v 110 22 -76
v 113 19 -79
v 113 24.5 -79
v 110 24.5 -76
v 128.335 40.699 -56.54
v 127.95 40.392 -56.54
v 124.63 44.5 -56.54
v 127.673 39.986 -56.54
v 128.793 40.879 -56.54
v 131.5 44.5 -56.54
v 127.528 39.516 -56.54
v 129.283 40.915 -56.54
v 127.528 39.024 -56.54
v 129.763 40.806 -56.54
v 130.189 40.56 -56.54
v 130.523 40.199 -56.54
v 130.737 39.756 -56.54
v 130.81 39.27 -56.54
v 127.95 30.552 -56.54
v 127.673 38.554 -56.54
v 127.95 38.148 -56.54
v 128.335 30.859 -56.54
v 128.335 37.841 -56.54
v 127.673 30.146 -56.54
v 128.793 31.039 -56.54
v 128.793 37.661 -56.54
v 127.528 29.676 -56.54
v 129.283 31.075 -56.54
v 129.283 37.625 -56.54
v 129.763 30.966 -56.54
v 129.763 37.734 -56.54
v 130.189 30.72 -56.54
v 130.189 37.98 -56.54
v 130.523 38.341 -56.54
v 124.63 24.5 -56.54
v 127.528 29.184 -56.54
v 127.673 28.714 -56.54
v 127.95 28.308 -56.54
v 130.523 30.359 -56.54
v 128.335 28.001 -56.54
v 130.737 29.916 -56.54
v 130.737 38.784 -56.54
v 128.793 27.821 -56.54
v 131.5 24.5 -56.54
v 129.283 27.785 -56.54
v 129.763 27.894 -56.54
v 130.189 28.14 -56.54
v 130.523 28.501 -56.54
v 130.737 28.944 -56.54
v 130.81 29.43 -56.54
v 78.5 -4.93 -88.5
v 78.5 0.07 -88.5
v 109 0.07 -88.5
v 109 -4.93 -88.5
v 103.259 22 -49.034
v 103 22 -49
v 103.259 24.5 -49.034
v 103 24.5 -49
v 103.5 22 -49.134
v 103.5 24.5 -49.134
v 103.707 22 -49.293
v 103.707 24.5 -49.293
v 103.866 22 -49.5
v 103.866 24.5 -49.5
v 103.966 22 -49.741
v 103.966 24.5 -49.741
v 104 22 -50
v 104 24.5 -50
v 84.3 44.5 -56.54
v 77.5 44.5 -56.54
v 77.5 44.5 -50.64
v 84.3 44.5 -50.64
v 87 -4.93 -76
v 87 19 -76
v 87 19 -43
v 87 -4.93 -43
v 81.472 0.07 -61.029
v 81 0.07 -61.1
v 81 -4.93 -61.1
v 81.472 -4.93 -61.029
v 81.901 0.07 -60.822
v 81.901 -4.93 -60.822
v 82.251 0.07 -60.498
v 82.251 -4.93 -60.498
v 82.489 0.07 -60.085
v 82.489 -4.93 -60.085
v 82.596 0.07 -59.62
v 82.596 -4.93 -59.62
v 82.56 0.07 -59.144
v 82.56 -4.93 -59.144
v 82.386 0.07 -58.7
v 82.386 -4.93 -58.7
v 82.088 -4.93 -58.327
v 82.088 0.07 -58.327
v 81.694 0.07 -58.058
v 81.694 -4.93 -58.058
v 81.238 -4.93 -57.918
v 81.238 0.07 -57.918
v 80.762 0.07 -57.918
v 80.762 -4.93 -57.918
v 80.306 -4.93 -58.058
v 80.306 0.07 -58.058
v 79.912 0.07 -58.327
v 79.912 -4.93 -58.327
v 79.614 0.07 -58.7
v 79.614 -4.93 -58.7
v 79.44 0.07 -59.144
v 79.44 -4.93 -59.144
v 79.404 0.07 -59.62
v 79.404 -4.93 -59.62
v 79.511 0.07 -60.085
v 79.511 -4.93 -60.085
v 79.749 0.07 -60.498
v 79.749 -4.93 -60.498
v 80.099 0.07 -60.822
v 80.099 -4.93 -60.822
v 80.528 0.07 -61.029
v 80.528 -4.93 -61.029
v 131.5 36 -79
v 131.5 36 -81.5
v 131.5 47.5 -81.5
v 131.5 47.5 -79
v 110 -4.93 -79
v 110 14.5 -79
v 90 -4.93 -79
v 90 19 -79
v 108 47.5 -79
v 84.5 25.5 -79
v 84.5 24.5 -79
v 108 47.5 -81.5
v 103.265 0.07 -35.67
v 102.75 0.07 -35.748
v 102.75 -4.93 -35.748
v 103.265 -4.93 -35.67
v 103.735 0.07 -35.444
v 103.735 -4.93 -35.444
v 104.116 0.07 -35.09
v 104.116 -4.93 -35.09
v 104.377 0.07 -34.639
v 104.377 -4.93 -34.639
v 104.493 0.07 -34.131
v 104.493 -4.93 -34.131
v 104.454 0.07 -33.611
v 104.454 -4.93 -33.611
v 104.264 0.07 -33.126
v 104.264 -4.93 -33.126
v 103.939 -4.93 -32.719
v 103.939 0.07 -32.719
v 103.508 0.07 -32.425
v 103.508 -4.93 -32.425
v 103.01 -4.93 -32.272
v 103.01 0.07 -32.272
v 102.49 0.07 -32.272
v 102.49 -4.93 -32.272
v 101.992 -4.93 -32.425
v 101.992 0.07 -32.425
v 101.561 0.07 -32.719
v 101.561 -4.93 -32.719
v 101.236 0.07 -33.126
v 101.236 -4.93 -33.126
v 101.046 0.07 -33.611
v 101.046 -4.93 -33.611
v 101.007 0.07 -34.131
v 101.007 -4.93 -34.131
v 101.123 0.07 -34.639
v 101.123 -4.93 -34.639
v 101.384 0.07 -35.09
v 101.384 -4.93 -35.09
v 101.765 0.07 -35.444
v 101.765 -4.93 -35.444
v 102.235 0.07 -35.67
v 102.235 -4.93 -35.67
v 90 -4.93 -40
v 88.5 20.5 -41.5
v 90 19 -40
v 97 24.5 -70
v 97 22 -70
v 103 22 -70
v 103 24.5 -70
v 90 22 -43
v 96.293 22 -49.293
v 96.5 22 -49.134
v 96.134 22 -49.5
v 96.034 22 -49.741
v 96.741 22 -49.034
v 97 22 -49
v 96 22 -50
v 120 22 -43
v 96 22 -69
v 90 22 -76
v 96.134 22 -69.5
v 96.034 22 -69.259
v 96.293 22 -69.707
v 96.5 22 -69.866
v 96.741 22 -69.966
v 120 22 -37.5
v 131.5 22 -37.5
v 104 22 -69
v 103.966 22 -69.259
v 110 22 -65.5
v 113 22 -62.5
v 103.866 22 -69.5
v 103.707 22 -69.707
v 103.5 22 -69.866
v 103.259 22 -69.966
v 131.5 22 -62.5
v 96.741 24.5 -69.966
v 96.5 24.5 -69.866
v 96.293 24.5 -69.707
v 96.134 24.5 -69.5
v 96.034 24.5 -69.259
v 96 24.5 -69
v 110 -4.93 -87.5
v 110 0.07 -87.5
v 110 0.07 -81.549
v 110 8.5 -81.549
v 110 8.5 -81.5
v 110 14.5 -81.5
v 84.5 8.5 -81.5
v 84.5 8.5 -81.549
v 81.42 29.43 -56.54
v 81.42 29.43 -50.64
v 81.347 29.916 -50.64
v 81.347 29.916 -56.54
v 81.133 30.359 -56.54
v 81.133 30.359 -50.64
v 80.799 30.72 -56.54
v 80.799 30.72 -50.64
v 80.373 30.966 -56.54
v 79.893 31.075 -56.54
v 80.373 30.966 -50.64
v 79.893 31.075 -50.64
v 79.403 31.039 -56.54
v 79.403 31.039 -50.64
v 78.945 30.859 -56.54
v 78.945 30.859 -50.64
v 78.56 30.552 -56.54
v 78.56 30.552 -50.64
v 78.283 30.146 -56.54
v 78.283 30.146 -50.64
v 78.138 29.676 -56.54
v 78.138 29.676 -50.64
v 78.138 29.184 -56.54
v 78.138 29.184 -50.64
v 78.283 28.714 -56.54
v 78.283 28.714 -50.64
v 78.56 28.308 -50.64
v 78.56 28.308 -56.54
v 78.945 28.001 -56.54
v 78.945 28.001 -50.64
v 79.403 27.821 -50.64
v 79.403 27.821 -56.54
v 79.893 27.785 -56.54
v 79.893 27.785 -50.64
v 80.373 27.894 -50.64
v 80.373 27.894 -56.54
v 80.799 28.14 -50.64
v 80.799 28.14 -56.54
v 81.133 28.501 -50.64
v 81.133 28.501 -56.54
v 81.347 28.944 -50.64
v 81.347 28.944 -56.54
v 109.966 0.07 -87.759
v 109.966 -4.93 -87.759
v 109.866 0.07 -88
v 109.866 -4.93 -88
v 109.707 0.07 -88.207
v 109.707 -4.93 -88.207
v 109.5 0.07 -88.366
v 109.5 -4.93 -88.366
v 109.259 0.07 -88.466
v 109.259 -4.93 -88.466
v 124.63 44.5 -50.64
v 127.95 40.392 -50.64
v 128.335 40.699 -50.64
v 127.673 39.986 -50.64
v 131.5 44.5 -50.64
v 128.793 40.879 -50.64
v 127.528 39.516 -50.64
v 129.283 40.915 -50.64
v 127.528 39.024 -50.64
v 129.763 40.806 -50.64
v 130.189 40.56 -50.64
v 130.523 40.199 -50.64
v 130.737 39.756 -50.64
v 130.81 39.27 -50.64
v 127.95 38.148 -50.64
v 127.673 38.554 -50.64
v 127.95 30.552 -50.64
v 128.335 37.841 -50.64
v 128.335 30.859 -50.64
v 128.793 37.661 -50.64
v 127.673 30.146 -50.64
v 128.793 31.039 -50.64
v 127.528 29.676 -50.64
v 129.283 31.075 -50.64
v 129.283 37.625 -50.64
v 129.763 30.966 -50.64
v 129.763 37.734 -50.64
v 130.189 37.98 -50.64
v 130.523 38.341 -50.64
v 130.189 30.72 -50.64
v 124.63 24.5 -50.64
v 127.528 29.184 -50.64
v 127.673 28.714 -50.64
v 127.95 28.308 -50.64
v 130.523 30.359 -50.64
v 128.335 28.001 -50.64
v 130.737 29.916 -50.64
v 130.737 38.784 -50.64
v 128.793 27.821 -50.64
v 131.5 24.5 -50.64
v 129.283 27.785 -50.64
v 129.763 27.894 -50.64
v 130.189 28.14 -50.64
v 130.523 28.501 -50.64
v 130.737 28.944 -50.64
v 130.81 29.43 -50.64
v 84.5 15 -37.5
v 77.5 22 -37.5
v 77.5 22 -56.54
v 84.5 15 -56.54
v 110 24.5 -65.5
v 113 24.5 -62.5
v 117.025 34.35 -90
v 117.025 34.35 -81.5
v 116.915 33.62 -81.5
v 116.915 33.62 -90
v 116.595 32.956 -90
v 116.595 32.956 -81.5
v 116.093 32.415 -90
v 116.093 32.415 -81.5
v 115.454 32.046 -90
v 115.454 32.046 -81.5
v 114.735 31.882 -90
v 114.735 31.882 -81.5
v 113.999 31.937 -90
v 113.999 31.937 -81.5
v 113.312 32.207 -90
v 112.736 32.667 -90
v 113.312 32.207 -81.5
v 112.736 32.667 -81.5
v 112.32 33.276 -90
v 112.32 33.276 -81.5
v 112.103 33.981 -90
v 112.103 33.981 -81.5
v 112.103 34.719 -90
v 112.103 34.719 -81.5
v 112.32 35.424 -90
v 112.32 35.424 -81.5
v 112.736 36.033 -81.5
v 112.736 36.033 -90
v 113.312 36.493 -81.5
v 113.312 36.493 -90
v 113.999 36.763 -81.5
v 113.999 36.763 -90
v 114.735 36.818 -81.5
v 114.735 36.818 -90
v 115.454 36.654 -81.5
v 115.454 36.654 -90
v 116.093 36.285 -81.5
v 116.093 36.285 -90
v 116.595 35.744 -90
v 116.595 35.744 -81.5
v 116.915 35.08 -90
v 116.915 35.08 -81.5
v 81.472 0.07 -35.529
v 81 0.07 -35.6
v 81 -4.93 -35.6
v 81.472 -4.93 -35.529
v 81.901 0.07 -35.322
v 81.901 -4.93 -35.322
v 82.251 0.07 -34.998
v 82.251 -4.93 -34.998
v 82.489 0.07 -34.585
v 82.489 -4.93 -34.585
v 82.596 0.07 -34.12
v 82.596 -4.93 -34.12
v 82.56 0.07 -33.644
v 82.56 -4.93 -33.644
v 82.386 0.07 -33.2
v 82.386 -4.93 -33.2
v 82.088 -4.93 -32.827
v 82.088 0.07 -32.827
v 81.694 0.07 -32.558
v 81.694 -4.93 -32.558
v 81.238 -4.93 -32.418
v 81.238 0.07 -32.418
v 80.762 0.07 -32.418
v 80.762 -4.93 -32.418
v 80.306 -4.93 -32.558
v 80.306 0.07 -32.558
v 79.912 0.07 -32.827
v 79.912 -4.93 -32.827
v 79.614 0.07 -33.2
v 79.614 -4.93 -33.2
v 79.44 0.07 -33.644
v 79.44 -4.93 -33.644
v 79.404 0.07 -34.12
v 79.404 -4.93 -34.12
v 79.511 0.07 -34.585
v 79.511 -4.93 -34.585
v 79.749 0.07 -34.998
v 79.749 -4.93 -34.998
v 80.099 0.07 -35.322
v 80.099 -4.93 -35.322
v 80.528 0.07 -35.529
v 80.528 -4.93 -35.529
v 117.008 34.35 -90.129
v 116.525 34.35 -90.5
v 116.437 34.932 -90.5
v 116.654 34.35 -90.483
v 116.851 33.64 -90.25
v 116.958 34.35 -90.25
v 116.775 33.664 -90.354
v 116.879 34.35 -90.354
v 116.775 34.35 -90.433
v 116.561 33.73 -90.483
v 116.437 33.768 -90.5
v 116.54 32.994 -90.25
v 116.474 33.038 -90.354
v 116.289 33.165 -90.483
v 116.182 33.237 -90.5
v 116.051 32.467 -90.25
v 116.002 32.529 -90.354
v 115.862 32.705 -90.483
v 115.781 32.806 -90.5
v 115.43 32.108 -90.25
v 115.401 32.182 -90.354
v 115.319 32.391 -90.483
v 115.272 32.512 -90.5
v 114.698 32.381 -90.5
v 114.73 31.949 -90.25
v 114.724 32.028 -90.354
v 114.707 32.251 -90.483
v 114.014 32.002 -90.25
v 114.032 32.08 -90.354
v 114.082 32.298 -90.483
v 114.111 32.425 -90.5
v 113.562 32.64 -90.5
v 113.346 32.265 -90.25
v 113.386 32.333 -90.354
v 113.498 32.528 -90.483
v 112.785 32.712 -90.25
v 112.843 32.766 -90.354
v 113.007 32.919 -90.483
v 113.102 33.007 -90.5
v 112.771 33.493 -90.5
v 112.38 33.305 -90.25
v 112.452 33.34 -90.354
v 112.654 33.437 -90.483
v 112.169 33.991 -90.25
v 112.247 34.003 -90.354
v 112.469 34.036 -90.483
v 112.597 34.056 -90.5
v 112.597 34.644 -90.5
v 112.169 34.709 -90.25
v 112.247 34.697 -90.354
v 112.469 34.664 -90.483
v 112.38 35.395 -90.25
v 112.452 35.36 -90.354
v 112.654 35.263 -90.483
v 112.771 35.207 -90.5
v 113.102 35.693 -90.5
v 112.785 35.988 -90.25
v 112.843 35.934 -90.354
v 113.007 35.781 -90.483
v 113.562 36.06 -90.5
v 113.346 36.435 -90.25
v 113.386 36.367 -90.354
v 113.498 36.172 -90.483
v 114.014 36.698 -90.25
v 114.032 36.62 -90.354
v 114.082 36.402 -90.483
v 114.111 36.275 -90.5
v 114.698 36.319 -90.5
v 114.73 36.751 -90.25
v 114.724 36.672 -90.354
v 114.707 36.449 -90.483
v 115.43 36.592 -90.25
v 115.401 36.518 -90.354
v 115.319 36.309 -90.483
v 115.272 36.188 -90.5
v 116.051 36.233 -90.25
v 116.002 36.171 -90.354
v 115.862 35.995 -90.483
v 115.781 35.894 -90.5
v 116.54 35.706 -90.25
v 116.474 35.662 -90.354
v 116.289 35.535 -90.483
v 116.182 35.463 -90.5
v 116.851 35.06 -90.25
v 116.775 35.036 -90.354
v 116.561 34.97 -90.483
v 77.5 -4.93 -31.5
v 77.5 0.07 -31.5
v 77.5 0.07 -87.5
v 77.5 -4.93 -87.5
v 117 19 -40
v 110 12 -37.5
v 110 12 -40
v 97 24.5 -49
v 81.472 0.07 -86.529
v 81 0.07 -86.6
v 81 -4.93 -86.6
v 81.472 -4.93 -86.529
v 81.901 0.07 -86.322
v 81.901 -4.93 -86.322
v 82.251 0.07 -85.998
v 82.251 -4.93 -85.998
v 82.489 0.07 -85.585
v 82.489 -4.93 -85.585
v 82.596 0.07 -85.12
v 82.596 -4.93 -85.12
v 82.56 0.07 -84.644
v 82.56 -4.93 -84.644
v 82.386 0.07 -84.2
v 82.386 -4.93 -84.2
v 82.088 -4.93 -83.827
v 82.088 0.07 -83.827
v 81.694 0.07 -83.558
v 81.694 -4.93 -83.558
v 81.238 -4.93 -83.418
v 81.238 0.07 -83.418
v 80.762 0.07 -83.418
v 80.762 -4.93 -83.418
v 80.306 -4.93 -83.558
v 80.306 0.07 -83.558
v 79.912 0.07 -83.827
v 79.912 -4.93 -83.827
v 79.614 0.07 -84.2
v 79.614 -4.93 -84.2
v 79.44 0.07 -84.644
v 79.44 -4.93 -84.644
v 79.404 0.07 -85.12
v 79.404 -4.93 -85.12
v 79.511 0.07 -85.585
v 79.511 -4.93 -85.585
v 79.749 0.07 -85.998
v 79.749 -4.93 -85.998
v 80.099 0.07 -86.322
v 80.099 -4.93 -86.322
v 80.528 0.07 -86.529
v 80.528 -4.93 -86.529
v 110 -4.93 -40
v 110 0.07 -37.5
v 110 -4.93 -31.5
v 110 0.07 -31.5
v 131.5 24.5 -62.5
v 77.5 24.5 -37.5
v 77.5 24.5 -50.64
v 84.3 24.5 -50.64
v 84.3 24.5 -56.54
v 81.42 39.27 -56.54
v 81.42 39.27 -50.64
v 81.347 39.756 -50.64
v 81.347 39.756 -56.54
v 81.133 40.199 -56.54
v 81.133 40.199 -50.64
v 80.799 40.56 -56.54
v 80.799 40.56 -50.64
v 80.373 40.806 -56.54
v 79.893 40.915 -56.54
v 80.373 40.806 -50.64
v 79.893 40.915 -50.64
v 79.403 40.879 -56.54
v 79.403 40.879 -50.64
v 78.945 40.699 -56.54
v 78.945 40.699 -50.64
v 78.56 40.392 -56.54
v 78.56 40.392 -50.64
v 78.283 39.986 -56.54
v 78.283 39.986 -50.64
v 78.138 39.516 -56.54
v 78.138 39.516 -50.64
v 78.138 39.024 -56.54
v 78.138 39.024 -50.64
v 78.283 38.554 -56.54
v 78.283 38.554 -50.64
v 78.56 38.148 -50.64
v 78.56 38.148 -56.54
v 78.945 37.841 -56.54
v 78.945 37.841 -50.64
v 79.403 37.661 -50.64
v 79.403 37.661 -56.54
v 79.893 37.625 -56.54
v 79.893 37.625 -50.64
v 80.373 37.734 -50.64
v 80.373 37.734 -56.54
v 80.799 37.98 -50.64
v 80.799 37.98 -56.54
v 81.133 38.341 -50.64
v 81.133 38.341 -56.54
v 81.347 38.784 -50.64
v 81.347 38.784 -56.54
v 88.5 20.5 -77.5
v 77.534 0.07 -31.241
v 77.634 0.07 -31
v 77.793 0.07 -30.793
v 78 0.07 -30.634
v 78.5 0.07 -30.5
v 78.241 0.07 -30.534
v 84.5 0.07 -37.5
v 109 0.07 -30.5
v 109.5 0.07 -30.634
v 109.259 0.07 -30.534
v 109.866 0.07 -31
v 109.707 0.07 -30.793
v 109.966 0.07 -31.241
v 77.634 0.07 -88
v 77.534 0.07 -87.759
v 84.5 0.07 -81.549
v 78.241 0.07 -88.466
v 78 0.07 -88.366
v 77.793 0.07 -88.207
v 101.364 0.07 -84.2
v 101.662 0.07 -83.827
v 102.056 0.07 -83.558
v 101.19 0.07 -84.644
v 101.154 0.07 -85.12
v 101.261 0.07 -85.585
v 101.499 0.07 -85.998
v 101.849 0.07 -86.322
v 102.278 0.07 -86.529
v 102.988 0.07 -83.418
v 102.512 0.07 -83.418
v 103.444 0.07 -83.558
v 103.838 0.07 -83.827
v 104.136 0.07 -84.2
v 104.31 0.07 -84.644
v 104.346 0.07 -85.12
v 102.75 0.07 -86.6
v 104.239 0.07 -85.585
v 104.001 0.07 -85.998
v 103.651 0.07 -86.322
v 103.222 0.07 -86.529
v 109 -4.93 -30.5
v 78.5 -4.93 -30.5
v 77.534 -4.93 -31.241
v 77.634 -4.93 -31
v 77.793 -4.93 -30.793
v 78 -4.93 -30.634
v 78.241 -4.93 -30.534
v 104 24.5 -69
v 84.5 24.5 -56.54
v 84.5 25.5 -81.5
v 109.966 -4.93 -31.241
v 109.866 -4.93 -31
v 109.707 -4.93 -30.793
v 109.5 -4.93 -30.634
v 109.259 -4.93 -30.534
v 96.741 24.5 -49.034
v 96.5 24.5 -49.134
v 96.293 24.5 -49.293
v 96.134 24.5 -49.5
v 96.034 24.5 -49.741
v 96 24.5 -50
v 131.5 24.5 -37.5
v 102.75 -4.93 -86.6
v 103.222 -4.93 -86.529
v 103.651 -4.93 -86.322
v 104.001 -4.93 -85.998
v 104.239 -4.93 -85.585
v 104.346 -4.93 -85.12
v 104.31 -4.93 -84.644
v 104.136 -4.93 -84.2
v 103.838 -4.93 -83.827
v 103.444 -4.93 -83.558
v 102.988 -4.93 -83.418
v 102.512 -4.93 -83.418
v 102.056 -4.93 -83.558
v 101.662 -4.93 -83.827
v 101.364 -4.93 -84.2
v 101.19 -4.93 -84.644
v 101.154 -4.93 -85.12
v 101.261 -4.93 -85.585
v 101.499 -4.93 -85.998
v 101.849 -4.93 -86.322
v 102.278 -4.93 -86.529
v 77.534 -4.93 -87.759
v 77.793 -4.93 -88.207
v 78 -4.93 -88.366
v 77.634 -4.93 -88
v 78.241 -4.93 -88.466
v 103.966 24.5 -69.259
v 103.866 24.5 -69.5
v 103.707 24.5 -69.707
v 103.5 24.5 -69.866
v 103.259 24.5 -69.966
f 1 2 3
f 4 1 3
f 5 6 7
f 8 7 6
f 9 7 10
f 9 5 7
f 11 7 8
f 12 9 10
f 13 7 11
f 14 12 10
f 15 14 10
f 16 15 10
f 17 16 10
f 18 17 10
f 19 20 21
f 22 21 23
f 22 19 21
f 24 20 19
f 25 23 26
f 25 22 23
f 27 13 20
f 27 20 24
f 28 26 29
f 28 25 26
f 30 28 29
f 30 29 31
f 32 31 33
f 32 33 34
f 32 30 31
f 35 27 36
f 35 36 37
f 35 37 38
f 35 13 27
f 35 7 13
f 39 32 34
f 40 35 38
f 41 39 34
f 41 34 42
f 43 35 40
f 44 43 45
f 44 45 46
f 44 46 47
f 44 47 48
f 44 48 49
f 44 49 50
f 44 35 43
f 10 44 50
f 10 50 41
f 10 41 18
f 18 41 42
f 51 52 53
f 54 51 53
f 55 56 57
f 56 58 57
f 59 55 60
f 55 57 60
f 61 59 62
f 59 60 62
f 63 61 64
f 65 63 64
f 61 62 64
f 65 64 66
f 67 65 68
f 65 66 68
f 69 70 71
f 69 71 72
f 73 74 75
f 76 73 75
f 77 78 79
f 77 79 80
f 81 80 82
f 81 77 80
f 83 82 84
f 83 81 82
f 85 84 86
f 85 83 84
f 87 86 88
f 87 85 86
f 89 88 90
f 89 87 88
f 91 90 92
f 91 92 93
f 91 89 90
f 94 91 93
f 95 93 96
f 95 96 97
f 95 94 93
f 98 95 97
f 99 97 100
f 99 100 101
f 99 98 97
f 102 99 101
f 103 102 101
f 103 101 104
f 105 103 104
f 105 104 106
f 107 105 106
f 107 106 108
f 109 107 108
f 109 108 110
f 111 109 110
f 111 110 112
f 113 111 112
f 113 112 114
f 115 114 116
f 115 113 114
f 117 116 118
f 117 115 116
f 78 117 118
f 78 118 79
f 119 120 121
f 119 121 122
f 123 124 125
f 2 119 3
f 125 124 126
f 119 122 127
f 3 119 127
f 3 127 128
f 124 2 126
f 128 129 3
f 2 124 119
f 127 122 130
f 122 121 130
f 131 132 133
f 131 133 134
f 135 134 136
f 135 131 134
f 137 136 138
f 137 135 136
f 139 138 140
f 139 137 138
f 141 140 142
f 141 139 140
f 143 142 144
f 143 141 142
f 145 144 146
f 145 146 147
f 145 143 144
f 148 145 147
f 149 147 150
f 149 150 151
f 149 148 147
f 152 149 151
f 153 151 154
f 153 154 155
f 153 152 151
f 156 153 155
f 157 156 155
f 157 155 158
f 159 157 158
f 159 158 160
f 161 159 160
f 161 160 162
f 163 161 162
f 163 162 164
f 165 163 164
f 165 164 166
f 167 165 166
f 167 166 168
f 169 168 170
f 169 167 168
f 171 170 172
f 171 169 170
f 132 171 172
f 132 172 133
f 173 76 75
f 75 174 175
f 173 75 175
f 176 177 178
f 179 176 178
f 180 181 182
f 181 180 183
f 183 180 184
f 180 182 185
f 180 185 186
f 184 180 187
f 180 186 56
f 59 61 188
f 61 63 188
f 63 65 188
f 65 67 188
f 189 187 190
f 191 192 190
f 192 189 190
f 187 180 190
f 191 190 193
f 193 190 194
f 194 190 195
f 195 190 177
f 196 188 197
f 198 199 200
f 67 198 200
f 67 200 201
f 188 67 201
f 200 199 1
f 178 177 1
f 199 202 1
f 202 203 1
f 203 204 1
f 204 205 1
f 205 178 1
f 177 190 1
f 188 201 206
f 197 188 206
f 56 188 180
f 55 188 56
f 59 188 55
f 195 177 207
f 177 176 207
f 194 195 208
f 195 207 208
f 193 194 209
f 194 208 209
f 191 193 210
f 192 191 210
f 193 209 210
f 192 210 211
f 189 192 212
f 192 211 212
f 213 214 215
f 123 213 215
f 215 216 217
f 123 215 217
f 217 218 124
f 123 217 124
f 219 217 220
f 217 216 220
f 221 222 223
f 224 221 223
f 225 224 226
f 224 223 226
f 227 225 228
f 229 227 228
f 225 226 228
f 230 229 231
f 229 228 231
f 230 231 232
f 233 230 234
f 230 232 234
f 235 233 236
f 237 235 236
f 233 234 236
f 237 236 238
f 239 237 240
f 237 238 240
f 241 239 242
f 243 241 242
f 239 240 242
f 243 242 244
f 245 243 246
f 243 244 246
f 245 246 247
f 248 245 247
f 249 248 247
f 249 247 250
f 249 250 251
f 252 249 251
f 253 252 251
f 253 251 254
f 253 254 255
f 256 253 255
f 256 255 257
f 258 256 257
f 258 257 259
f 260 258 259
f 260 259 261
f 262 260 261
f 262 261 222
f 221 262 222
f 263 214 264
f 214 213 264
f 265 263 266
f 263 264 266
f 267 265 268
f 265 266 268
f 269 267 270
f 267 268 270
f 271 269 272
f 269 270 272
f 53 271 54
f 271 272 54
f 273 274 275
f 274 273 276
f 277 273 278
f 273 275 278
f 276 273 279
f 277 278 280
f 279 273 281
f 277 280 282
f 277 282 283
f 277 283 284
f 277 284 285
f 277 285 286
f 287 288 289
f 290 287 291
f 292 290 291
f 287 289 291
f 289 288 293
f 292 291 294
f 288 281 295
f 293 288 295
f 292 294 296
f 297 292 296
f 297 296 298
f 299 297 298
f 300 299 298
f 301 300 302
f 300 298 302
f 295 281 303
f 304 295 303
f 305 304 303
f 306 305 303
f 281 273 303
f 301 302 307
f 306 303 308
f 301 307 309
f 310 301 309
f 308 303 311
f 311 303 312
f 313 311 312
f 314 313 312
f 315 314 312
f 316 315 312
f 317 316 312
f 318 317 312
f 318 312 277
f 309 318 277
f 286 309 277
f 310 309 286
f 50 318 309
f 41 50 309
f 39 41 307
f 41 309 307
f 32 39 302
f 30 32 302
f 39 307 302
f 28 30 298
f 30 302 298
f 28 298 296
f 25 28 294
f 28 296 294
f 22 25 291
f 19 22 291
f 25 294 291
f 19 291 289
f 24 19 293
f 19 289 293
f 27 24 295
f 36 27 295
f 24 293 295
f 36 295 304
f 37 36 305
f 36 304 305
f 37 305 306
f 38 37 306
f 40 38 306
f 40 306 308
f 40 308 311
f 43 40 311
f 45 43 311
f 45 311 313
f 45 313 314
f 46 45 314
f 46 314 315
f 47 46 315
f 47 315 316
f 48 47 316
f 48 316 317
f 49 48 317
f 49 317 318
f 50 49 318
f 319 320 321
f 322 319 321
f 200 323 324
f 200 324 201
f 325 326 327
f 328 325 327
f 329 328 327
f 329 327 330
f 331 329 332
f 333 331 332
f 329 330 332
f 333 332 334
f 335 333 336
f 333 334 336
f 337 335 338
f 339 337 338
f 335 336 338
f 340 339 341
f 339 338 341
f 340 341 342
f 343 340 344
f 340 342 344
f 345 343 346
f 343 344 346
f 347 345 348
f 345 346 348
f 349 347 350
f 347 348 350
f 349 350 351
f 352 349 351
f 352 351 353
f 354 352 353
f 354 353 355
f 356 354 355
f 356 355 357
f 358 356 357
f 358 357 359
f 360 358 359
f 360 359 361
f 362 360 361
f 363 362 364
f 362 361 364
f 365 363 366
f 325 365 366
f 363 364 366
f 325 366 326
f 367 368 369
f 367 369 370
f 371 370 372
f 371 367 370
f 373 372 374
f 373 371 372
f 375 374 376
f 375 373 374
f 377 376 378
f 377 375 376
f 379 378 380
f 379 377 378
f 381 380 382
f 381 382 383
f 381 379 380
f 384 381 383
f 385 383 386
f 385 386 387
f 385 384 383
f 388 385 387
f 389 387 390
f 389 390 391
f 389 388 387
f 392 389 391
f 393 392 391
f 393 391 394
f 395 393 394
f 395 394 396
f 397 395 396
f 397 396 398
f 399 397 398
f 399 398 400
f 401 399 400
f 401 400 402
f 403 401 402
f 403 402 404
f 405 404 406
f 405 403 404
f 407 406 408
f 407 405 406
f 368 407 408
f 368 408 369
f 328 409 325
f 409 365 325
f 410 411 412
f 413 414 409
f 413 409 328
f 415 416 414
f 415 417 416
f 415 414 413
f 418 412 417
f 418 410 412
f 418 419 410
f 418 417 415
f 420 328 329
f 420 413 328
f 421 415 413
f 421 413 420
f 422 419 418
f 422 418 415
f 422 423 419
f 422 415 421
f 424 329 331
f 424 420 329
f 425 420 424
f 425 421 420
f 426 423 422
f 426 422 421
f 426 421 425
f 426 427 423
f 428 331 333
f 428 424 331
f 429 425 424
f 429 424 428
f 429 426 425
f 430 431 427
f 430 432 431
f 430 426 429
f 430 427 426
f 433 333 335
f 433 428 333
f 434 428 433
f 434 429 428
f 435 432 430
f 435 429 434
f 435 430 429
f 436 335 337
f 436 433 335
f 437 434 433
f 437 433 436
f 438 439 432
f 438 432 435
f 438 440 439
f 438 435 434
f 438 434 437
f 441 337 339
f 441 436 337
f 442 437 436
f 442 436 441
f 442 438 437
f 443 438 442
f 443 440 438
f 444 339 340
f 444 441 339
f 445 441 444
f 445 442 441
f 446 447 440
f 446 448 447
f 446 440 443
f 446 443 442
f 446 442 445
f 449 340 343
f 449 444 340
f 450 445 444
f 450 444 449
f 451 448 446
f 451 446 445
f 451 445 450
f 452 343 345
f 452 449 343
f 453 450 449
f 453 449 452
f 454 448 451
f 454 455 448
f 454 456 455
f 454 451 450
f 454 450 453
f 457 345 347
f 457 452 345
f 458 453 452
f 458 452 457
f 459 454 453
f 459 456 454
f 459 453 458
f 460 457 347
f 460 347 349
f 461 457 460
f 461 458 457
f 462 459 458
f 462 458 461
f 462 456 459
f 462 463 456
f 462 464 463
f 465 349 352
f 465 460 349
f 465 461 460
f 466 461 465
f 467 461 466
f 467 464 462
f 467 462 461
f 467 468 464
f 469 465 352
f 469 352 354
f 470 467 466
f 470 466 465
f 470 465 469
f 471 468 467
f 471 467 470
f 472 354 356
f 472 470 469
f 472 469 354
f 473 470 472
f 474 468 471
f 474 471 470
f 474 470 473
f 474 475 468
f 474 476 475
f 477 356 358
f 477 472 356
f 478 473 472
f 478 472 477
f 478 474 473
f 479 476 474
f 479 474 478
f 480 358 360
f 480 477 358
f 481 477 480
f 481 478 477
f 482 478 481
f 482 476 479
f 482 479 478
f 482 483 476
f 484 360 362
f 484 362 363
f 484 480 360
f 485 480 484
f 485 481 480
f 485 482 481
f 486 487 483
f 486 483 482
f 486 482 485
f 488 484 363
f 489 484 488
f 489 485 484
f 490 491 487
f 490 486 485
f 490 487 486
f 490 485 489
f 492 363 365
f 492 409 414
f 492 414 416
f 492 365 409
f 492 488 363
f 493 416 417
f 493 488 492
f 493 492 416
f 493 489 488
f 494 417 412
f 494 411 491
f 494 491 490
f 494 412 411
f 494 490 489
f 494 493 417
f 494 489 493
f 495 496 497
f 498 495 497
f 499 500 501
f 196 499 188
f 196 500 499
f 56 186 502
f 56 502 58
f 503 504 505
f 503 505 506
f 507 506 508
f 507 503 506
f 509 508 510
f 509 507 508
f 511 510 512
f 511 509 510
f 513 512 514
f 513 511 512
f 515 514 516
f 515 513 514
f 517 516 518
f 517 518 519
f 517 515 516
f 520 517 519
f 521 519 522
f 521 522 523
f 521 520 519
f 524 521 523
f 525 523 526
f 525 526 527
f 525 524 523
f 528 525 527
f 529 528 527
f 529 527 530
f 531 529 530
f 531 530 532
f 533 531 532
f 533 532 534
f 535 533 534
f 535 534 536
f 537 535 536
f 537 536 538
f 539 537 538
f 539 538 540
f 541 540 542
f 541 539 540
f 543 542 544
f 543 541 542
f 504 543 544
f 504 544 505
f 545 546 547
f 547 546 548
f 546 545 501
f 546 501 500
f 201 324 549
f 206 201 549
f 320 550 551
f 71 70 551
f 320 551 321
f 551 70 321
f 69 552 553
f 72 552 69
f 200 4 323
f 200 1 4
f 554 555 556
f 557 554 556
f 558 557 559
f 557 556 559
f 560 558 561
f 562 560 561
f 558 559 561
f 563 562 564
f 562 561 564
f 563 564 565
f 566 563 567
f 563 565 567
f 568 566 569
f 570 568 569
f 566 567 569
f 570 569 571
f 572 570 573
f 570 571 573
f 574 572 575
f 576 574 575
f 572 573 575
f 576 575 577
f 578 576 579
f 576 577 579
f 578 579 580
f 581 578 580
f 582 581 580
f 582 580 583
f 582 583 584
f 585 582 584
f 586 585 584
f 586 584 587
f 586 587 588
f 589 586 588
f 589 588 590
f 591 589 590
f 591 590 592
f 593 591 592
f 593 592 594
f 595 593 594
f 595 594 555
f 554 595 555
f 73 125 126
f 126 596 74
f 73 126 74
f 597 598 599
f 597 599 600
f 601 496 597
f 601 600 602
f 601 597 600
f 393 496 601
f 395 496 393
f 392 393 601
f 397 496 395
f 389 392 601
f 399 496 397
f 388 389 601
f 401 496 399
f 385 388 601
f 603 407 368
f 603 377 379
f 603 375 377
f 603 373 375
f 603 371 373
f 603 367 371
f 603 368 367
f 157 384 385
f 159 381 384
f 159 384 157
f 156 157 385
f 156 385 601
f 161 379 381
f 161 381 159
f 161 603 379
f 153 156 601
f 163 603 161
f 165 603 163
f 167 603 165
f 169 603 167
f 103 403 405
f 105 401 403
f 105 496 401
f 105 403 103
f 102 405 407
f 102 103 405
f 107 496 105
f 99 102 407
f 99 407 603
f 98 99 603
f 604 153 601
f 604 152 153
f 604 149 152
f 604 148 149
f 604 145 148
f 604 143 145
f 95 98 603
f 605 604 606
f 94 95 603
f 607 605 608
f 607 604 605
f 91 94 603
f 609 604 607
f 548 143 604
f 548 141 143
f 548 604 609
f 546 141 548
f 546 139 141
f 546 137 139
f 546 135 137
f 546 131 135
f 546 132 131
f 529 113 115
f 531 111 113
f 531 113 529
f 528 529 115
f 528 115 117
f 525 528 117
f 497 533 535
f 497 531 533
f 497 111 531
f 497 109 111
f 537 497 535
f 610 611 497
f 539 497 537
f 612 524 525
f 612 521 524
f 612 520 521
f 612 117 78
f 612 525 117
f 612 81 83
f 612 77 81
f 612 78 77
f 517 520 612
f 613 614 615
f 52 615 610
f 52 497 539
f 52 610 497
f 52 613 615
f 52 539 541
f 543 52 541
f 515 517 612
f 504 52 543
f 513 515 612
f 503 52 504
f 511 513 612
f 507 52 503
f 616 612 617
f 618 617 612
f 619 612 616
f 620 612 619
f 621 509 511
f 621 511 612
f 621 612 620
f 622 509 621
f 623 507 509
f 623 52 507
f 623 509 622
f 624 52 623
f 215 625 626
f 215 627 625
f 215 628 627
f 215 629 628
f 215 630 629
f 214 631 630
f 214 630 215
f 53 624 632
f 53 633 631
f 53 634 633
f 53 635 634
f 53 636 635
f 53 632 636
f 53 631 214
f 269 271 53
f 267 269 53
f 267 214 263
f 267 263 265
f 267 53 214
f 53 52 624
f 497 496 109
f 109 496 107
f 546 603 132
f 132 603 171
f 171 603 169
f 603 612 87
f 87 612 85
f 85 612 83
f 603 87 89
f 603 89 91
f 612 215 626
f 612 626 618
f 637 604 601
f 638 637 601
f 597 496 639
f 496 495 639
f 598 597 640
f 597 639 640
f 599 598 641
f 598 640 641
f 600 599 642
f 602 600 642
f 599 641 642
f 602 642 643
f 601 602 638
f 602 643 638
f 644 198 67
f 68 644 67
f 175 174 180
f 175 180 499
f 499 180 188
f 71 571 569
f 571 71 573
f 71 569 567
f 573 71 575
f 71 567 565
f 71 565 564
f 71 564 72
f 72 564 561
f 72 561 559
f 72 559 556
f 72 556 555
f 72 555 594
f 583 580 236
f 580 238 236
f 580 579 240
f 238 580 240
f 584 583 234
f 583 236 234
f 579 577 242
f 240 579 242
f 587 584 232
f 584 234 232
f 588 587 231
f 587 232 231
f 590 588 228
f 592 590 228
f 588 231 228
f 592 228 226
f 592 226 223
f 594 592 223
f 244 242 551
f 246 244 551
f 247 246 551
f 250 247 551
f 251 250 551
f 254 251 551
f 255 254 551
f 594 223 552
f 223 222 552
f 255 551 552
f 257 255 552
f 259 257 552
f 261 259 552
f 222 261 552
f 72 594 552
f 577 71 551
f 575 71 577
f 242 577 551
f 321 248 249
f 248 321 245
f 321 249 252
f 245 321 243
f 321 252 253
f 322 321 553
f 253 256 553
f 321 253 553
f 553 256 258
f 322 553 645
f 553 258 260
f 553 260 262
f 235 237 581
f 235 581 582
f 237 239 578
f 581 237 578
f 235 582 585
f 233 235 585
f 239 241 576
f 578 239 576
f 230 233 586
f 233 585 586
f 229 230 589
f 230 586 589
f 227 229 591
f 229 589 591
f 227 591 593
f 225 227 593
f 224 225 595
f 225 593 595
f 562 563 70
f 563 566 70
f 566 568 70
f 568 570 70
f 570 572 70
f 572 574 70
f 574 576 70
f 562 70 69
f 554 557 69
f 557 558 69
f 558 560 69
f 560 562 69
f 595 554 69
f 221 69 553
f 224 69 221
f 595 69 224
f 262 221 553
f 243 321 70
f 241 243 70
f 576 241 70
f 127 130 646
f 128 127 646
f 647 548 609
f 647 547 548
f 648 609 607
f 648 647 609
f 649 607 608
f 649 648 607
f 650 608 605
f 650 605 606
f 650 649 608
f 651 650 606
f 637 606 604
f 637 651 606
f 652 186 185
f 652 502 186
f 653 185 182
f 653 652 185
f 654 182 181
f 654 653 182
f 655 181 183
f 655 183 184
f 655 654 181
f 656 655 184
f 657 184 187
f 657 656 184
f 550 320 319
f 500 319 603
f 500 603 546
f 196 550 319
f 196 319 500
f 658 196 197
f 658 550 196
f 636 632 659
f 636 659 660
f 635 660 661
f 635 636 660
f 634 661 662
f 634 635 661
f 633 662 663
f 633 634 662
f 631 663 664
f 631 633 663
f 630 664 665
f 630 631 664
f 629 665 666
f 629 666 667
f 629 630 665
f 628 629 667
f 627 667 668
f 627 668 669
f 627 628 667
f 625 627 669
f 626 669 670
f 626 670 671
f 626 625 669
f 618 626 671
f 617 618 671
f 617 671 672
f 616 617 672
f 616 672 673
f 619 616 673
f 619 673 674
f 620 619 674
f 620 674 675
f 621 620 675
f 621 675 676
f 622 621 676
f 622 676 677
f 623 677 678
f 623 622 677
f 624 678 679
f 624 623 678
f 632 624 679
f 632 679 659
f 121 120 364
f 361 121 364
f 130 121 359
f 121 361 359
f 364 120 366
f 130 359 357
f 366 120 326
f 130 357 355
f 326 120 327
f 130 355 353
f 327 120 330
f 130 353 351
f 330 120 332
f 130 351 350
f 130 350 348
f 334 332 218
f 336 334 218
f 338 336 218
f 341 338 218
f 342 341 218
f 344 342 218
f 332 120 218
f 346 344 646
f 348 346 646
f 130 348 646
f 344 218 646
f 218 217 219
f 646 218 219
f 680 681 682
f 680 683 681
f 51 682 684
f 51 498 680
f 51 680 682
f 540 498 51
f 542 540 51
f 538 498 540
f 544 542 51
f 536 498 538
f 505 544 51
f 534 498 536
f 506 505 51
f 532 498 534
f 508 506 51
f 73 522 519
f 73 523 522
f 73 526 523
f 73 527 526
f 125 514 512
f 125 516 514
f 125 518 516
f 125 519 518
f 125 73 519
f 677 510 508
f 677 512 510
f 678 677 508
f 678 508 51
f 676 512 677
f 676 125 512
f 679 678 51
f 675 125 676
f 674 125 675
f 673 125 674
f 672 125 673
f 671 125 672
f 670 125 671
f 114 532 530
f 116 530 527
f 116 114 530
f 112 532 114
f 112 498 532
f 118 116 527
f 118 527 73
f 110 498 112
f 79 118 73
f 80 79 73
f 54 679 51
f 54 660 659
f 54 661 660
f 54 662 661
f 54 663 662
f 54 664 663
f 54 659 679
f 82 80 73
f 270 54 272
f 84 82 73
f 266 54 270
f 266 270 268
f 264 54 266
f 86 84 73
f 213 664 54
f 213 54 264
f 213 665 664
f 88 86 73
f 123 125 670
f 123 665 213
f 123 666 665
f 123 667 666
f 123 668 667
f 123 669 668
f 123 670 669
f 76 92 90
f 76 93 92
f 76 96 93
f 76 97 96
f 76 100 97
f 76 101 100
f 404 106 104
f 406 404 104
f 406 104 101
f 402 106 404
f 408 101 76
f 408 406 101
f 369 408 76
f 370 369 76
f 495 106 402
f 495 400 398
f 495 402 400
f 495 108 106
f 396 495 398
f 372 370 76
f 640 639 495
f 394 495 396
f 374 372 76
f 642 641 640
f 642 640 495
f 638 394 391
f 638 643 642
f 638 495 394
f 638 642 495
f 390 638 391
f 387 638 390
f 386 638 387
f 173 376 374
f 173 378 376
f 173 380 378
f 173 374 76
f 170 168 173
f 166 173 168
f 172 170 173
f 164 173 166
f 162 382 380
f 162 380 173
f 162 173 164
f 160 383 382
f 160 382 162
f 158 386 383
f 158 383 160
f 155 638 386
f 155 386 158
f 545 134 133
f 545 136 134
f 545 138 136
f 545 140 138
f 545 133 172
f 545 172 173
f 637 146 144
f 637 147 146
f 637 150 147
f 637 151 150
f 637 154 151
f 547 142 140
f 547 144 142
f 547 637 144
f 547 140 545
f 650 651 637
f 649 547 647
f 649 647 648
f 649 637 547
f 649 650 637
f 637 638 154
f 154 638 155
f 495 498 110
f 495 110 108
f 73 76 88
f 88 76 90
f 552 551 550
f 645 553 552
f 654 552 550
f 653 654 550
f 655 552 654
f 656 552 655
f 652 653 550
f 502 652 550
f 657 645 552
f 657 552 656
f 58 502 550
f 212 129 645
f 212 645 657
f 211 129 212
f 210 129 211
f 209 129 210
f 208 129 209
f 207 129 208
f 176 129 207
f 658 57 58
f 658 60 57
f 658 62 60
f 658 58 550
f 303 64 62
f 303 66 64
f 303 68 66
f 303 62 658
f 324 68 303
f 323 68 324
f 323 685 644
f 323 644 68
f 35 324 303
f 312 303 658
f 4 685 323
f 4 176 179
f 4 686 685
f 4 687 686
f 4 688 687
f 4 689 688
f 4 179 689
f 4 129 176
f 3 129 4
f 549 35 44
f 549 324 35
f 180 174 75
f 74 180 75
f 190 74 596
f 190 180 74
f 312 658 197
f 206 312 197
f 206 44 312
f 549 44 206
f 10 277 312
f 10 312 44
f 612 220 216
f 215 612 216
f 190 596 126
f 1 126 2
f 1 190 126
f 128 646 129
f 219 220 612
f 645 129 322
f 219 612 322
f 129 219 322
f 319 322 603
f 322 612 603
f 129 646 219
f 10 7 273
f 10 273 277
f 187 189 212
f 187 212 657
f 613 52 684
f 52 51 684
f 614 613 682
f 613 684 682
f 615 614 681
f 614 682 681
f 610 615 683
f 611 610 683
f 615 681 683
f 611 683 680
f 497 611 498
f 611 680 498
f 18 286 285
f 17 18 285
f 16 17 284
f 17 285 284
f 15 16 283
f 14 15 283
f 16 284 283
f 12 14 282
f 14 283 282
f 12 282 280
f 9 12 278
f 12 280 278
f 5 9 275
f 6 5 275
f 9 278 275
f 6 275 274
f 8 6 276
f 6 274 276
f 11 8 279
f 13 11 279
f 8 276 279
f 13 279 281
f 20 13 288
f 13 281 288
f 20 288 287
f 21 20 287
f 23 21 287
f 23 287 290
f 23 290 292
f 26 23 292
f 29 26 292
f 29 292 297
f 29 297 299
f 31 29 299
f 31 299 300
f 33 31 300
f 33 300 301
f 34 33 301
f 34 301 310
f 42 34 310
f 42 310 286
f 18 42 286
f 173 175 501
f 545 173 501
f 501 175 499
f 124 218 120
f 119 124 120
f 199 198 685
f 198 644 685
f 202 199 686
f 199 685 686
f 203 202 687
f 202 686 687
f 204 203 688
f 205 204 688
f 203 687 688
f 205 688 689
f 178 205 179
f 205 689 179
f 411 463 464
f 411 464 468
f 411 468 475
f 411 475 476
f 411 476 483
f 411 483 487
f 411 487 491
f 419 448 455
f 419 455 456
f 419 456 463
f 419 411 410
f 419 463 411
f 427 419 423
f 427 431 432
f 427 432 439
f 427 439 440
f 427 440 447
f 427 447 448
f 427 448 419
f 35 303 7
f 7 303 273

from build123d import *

# Parameters (mm, degrees)
BOSS_EXTRUDE1_DEPTH  = 3.5
BOSS_EXTRUDE2_DEPTH  = 21
SKETCH3_W            = 23
SKETCH3_H            = 39
BOSS_EXTRUDE3_DEPTH  = 2.5
SKETCH5_W            = 21.5
SKETCH5_H            = 25
SKETCH5_W_2          = 7.07
SKETCH5_H_2          = 19.04
BOSS_EXTRUDE5_DEPTH  = 2.5
SKETCH6_W            = 7.07
SKETCH6_H            = 5.9
BOSS_EXTRUDE6_DEPTH  = 20
BOSS_EXTRUDE7_DEPTH  = 23
FILLET1_SIZE         = 10
SKETCH9_R            = 2.475
BOSS_EXTRUDE8_DEPTH  = 9
FILLET2_R            = 0.5
SKETCH10_R           = 1.65
CUT_EXTRUDE1_DEPTH   = 9
SKETCH11_W           = 0.2
SKETCH11_H           = 20
CUT_EXTRUDE2_DEPTH   = 9
CUT_EXTRUDE3_DEPTH   = 9
FILLET3_SIZE         = 3
BOSS_EXTRUDE9_DEPTH  = 5
SKETCH14_R           = 1.747814763
SKETCH14_R_2         = 1.6
CUT_EXTRUDE4_DEPTH   = 15
SKETCH15_W           = 110
SKETCH15_H           = 3.5
CUT_EXTRUDE5_DEPTH   = 150
FILLET4_SIZE         = 7
FILLET5_SIZE         = 3
FILLET6_SIZE         = 3
SKETCH17_W           = 8
SKETCH17_H           = 21
CUT_EXTRUDE6_DEPTH   = 150
FILLET7_R            = 1
FILLET9_SIZE         = 3
SKETCH19_R           = 1.747814763
SKETCH19_R_2         = 1.6
BOSS_EXTRUDE10_DEPTH = 8.43
CUT_EXTRUDE7_DEPTH   = 8.43
FILLET10_R           = 1


# Some blends are built 0.0001 mm under size
with BuildPart() as part:
    # Sketch1 → Boss-Extrude1 (new body)
    with BuildSketch(Plane(origin=(0, 0, 0), x_dir=(1, 0, 0), z_dir=(0, 1, 0))):
        Polygon((0, 40), (23, 40), (23, 79), (0, 79), (0, 100), (110, 100), (110, 79), (87, 79), (87, 40), (110, 40), (110, 20), (80, 0), (30, 0), (0, 20), align=None)
    extrude(amount=BOSS_EXTRUDE1_DEPTH)

    # Sketch2 → Boss-Extrude2 (add)
    with BuildSketch(Plane(origin=(0, 3.5, 0), x_dir=(1, 0, 0), z_dir=(0, 1, 0))):
        Polygon((0, 79), (23, 79), (23, 40), (0, 40), (0, 37.5), (25.5, 37.5), (25.5, 81.5), (0, 81.5), align=None)
        Polygon((110, 81.5), (84.5, 81.5), (84.5, 37.5), (110, 37.5), (110, 40), (87, 40), (87, 79), (110, 79), align=None)
    extrude(amount=BOSS_EXTRUDE2_DEPTH)

    # Sketch3 → Boss-Extrude3 (add)
    with BuildSketch(Plane(origin=(0, 24.5, 0), x_dir=(1, 0, 0), z_dir=(0, 1, 0))):
        with Locations((11.5, 59.5)):
            Rectangle(SKETCH3_W, SKETCH3_H)
        with Locations((98.5, 59.5)):
            Rectangle(SKETCH3_W, SKETCH3_H)
    extrude(amount=-BOSS_EXTRUDE3_DEPTH)

    # Sketch5 → Boss-Extrude5 (add)
    with BuildSketch(Plane(origin=(0, 24.5, 0), x_dir=(1, 0, 0), z_dir=(0, 1, 0))):
        with Locations((120.75, 50)):
            Rectangle(SKETCH5_W, SKETCH5_H)
        with Locations((-10.75, 50)):
            Rectangle(SKETCH5_W, SKETCH5_H)
        with Locations((29.035, 47.02)):
            Rectangle(SKETCH5_W_2, SKETCH5_H_2)
        with Locations((80.965, 47.02)):
            Rectangle(SKETCH5_W_2, SKETCH5_H_2)
    extrude(amount=-BOSS_EXTRUDE5_DEPTH)

    # Sketch6 → Boss-Extrude6 (add)
    with BuildSketch(Plane(origin=(0, 24.5, 0), x_dir=(1, 0, 0), z_dir=(0, 1, 0))):
        with Locations((29.035, 53.59)):
            Rectangle(SKETCH6_W, SKETCH6_H)
        with Locations((80.965, 53.59)):
            Rectangle(SKETCH6_W, SKETCH6_H)
        with Locations((-17.965, 53.59)):
            Rectangle(SKETCH6_W, SKETCH6_H)
        with Locations((127.965, 53.59)):
            Rectangle(SKETCH6_W, SKETCH6_H)
    extrude(amount=BOSS_EXTRUDE6_DEPTH)

    # Sketch7 → Boss-Extrude7 (add)
    with BuildSketch(Plane(origin=(0, 24.5, 0), x_dir=(1, 0, 0), z_dir=(0, 1, 0))):
        Polygon((0, 81.5), (25.5, 81.5), (25.5, 79), (0, 79), (-21.5, 79), (-21.5, 81.5), align=None)
        Polygon((110, 79), (84.5, 79), (84.5, 81.5), (110, 81.5), (131.5, 81.5), (131.5, 79), align=None)
    extrude(amount=BOSS_EXTRUDE7_DEPTH)

    # Fillet1
    # the kernel refuses this chamfer: 10 mm, written as the material it adds along each edge
    with BuildSketch(Plane(origin=(0, 22, -40), x_dir=(0.027495876610586372, -0.9996219169112968, 0), z_dir=(0, 0, 1)), Plane(origin=(110, 22, -37.5), x_dir=(-0.027495876610586317, -0.9996219169112968, 0), z_dir=(0, 0, -1)), Plane(origin=(110, 24.5, -81.5), x_dir=(0.9996219169112968, 0.027495876610586317, 0), z_dir=(0, 0, 1))) as fillet1_piece_1:
        Polygon((FILLET1_SIZE * 0.999621916911, -FILLET1_SIZE * 0.0274958766106), (-FILLET1_SIZE * 0.0274958766106, -FILLET1_SIZE * 0.999621916911), (0, 0), align=None)
    extrude(amount=2.5)
    with BuildSketch(Plane(origin=(0, 24.5, -79), x_dir=(0.027495876610586372, -0.9996219169112968, 0), z_dir=(0, 0, -1))) as fillet1_piece_2:
        Polygon((FILLET1_SIZE * 0.999621916911, FILLET1_SIZE * 0.0274958766106), (-FILLET1_SIZE * 0.0274958766106, FILLET1_SIZE * 0.999621916911), (0, 0), align=None)
    extrude(amount=2.5)

    # Sketch9 → Boss-Extrude8 (add)
    with BuildSketch(Plane(origin=(0, 0, -81.5), x_dir=(-1, 0, 0), z_dir=(0, 0, -1))):
        with Locations(Location((-114.55, 34.35, 0), (0, 0, 180))):
            Circle(SKETCH9_R)
        with Locations(Location((4.55, 34.35, 0), (0, 0, 180))):
            Circle(SKETCH9_R)
    extrude(amount=BOSS_EXTRUDE8_DEPTH)

    # Fillet2
    fillet2_edges = [part.edges().sort_by_distance(p)[0] for p in [
        (112.075, 34.35, -90.5),
        (-7.025, 34.35, -90.5),
    ]]
    fillet(fillet2_edges, radius=FILLET2_R)

    # Sketch10 → Cut-Extrude1 (cut)
    with BuildSketch(Plane.XY.offset(-50.64)):
        with Locations((129.16, 39.27)):
            Circle(SKETCH10_R)
        with Locations((129.16, 29.43)):
            Circle(SKETCH10_R)
        with Locations((79.77, 39.27)):
            Circle(SKETCH10_R)
        with Locations((79.77, 29.43)):
            Circle(SKETCH10_R)
        with Locations((-19.16, 29.43)):
            Circle(SKETCH10_R)
        with Locations((-19.16, 39.27)):
            Circle(SKETCH10_R)
        with Locations(Location((30.23, 39.27, 0), (0, 0, 180))):
            Circle(SKETCH10_R)
        with Locations(Location((30.23, 29.43, 0), (0, 0, 180))):
            Circle(SKETCH10_R)
    extrude(amount=-CUT_EXTRUDE1_DEPTH, mode=Mode.SUBTRACT)

    # Sketch11 → Cut-Extrude2 (cut)
    with BuildSketch(Plane.XY.offset(-50.64)):
        with Locations((-14.53, 34.5)):
            Rectangle(SKETCH11_W, SKETCH11_H)
        with Locations((25.6, 34.5)):
            Rectangle(SKETCH11_W, SKETCH11_H)
        with Locations((84.4, 34.5)):
            Rectangle(SKETCH11_W, SKETCH11_H)
        with Locations((124.53, 34.5)):
            Rectangle(SKETCH11_W, SKETCH11_H)
    extrude(amount=-CUT_EXTRUDE2_DEPTH, mode=Mode.SUBTRACT)

    # Sketch12 → Cut-Extrude3 (cut)
    with BuildSketch(Plane(origin=(0, 0, -81.5), x_dir=(-1, 0, 0), z_dir=(0, 0, -1))):
        Polygon((-108, 47.5), (-84.5, 25.5), (-84.5, 47.5), align=None)
        Polygon((-25.5, 25.5), (-25.5, 47.5), (-2, 47.5), align=None)
        Polygon((-120, 24.5), (-131.5, 36), (-131.5, 24.5), align=None)
        Polygon((10, 24.5), (21.5, 36), (21.5, 24.5), align=None)
    extrude(amount=-CUT_EXTRUDE3_DEPTH, mode=Mode.SUBTRACT)

    # Fillet3
    fillet3_edges = [part.edges().sort_by_distance(p)[0] for p in [
        (0, 23.25, -62.5),
        (110, 23.25, -62.5),
    ]]
    chamfer(fillet3_edges, length=FILLET3_SIZE)

    # Sketch13 → Boss-Extrude9 (add)
    with BuildSketch(Plane(origin=(0, 3.5, 0), x_dir=(1, 0, 0), z_dir=(0, 1, 0))):
        Polygon((0, 30.5), (32.5, 30.5), (32.5, 88.5), (0, 88.5), (0, 81.5), (25.5, 81.5), (25.5, 37.5), (0, 37.5), align=None)
        Polygon((84.5, 37.5), (110, 37.5), (110, 30.5), (77.5, 30.5), (77.5, 88.5), (110, 88.5), (110, 81.5), (84.5, 81.5), align=None)
    extrude(amount=BOSS_EXTRUDE9_DEPTH)

    # Sketch14 → Cut-Extrude4 (cut)
    with BuildSketch(Plane(origin=(0, 8.5, 0), x_dir=(1, 0, 0), z_dir=(0, 1, 0))):
        with Locations(Location((7.25, 34, 0), (0, 0, 270))):
            Circle(SKETCH14_R)
        with Locations(Location((7.25, 85, 0), (0, 0, 270))):
            Circle(SKETCH14_R_2)
        with Locations(Location((29, 34, 0), (0, 0, 270))):
            Circle(SKETCH14_R_2)
        with Locations(Location((29, 59.5, 0), (0, 0, 270))):
            Circle(SKETCH14_R_2)
        with Locations(Location((29, 85, 0), (0, 0, 270))):
            Circle(SKETCH14_R_2)
        with Locations(Location((81, 34, 0), (0, 0, 90))):
            Circle(SKETCH14_R_2)
        with Locations(Location((102.75, 34, 0), (0, 0, 90))):
            Circle(SKETCH14_R)
        with Locations(Location((81, 59.5, 0), (0, 0, 90))):
            Circle(SKETCH14_R_2)
        with Locations(Location((81, 85, 0), (0, 0, 90))):
            Circle(SKETCH14_R_2)
        with Locations(Location((102.75, 85, 0), (0, 0, 90))):
            Circle(SKETCH14_R_2)
    extrude(amount=-CUT_EXTRUDE4_DEPTH, mode=Mode.SUBTRACT)

    # Sketch15 → Cut-Extrude5 (cut)
    with BuildSketch(Plane(origin=(0, 0, -100), x_dir=(-1, 0, 0), z_dir=(0, 0, -1))):
        Polygon((-77.5, 47.5), (-77.5, 3.5), (0, 3.5), (21.5, 3.5), (21.5, 47.5), align=None)
        with Locations((-55, 1.75)):
            Rectangle(SKETCH15_W, SKETCH15_H)
    extrude(amount=-CUT_EXTRUDE5_DEPTH, mode=Mode.SUBTRACT)

    # Fillet4
    fillet4_edges = [part.edges().sort_by_distance(p)[0] for p in [
        (84.5, 22, -47.02),
    ]]
    chamfer(fillet4_edges, length=FILLET4_SIZE - 0.0001)  # a hair under: the kernel refuses the full size

    # Fillet5
    fillet5_edges = [part.edges().sort_by_distance(p)[0] for p in [
        (87, 22, -59.5),
        (98.5, 22, -79),
        (103.5, 22, -40),
    ]]
    chamfer(fillet5_edges, length=FILLET5_SIZE)

    # Fillet6
    fillet6_edges = [part.edges().sort_by_distance(p)[0] for p in [
        (110, 21.75, -79),
    ]]
    chamfer(fillet6_edges, length=FILLET6_SIZE)

    # Sketch17 → Cut-Extrude6 (cut)
    with BuildSketch(Plane.XZ.offset(-22)):
        with Locations((100, -59.5)):
            Rectangle(SKETCH17_W, SKETCH17_H)
    extrude(amount=-CUT_EXTRUDE6_DEPTH, mode=Mode.SUBTRACT)

    # Fillet7
    fillet7_edges = [part.edges().sort_by_distance(p)[0] for p in [
        (96, 23.25, -70),
        (96, 23.25, -49),
        (104, 23.25, -49),
        (104, 23.25, -70),
    ]]
    fillet(fillet7_edges, radius=FILLET7_R)

    # Fillet9
    fillet9_edges = [part.edges().sort_by_distance(p)[0] for p in [
        (87, 11.25, -79),
        (87, 11.25, -40),
    ]]
    chamfer(fillet9_edges, length=FILLET9_SIZE)

    # Sketch19 → Boss-Extrude10 (add)
    with BuildSketch(Plane.XZ.offset(-3.5)):
        Polygon((110, -40), (110, -30.5), (77.5, -30.5), (77.5, -88.5), (110, -88.5), (110, -79), (90, -79), (87, -76), (87, -43), (90, -40), align=None)
        with Locations(Location((102.75, -34, 0), (0, 0, 270))):
            Circle(SKETCH19_R, mode=Mode.SUBTRACT)
        with Locations(Location((81, -34, 0), (0, 0, 270))):
            Circle(SKETCH19_R_2, mode=Mode.SUBTRACT)
        with Locations(Location((81, -59.5, 0), (0, 0, 270))):
            Circle(SKETCH19_R_2, mode=Mode.SUBTRACT)
        with Locations(Location((81, -85, 0), (0, 0, 270))):
            Circle(SKETCH19_R_2, mode=Mode.SUBTRACT)
        with Locations(Location((102.75, -85, 0), (0, 0, 270))):
            Circle(SKETCH19_R_2, mode=Mode.SUBTRACT)
    extrude(amount=BOSS_EXTRUDE10_DEPTH)

    # Sketch20 → Cut-Extrude7 (cut)
    with BuildSketch(Plane(origin=(0, 8.5, 0), x_dir=(1, 0, 0), z_dir=(0, 1, 0))):
        Polygon((110, 88.5), (77.5, 88.5), (77.5, 81.549434768), (77.5, 30.5), (84.5, 30.5), (110, 30.5), (110, 37.5), (84.5, 37.5), (84.5, 81.549434768), (110, 81.549434768), align=None)
    extrude(amount=-CUT_EXTRUDE7_DEPTH, mode=Mode.SUBTRACT)

    # Fillet10
    fillet10_edges = [part.edges().sort_by_distance(p)[0] for p in [
        (77.5, -2.43, -30.5),
        (110, -2.43, -30.5),
        (77.5, -2.43, -88.5),
        (110, -2.43, -88.5),
    ]]
    fillet(fillet10_edges, radius=FILLET10_R)


solid = part.part
